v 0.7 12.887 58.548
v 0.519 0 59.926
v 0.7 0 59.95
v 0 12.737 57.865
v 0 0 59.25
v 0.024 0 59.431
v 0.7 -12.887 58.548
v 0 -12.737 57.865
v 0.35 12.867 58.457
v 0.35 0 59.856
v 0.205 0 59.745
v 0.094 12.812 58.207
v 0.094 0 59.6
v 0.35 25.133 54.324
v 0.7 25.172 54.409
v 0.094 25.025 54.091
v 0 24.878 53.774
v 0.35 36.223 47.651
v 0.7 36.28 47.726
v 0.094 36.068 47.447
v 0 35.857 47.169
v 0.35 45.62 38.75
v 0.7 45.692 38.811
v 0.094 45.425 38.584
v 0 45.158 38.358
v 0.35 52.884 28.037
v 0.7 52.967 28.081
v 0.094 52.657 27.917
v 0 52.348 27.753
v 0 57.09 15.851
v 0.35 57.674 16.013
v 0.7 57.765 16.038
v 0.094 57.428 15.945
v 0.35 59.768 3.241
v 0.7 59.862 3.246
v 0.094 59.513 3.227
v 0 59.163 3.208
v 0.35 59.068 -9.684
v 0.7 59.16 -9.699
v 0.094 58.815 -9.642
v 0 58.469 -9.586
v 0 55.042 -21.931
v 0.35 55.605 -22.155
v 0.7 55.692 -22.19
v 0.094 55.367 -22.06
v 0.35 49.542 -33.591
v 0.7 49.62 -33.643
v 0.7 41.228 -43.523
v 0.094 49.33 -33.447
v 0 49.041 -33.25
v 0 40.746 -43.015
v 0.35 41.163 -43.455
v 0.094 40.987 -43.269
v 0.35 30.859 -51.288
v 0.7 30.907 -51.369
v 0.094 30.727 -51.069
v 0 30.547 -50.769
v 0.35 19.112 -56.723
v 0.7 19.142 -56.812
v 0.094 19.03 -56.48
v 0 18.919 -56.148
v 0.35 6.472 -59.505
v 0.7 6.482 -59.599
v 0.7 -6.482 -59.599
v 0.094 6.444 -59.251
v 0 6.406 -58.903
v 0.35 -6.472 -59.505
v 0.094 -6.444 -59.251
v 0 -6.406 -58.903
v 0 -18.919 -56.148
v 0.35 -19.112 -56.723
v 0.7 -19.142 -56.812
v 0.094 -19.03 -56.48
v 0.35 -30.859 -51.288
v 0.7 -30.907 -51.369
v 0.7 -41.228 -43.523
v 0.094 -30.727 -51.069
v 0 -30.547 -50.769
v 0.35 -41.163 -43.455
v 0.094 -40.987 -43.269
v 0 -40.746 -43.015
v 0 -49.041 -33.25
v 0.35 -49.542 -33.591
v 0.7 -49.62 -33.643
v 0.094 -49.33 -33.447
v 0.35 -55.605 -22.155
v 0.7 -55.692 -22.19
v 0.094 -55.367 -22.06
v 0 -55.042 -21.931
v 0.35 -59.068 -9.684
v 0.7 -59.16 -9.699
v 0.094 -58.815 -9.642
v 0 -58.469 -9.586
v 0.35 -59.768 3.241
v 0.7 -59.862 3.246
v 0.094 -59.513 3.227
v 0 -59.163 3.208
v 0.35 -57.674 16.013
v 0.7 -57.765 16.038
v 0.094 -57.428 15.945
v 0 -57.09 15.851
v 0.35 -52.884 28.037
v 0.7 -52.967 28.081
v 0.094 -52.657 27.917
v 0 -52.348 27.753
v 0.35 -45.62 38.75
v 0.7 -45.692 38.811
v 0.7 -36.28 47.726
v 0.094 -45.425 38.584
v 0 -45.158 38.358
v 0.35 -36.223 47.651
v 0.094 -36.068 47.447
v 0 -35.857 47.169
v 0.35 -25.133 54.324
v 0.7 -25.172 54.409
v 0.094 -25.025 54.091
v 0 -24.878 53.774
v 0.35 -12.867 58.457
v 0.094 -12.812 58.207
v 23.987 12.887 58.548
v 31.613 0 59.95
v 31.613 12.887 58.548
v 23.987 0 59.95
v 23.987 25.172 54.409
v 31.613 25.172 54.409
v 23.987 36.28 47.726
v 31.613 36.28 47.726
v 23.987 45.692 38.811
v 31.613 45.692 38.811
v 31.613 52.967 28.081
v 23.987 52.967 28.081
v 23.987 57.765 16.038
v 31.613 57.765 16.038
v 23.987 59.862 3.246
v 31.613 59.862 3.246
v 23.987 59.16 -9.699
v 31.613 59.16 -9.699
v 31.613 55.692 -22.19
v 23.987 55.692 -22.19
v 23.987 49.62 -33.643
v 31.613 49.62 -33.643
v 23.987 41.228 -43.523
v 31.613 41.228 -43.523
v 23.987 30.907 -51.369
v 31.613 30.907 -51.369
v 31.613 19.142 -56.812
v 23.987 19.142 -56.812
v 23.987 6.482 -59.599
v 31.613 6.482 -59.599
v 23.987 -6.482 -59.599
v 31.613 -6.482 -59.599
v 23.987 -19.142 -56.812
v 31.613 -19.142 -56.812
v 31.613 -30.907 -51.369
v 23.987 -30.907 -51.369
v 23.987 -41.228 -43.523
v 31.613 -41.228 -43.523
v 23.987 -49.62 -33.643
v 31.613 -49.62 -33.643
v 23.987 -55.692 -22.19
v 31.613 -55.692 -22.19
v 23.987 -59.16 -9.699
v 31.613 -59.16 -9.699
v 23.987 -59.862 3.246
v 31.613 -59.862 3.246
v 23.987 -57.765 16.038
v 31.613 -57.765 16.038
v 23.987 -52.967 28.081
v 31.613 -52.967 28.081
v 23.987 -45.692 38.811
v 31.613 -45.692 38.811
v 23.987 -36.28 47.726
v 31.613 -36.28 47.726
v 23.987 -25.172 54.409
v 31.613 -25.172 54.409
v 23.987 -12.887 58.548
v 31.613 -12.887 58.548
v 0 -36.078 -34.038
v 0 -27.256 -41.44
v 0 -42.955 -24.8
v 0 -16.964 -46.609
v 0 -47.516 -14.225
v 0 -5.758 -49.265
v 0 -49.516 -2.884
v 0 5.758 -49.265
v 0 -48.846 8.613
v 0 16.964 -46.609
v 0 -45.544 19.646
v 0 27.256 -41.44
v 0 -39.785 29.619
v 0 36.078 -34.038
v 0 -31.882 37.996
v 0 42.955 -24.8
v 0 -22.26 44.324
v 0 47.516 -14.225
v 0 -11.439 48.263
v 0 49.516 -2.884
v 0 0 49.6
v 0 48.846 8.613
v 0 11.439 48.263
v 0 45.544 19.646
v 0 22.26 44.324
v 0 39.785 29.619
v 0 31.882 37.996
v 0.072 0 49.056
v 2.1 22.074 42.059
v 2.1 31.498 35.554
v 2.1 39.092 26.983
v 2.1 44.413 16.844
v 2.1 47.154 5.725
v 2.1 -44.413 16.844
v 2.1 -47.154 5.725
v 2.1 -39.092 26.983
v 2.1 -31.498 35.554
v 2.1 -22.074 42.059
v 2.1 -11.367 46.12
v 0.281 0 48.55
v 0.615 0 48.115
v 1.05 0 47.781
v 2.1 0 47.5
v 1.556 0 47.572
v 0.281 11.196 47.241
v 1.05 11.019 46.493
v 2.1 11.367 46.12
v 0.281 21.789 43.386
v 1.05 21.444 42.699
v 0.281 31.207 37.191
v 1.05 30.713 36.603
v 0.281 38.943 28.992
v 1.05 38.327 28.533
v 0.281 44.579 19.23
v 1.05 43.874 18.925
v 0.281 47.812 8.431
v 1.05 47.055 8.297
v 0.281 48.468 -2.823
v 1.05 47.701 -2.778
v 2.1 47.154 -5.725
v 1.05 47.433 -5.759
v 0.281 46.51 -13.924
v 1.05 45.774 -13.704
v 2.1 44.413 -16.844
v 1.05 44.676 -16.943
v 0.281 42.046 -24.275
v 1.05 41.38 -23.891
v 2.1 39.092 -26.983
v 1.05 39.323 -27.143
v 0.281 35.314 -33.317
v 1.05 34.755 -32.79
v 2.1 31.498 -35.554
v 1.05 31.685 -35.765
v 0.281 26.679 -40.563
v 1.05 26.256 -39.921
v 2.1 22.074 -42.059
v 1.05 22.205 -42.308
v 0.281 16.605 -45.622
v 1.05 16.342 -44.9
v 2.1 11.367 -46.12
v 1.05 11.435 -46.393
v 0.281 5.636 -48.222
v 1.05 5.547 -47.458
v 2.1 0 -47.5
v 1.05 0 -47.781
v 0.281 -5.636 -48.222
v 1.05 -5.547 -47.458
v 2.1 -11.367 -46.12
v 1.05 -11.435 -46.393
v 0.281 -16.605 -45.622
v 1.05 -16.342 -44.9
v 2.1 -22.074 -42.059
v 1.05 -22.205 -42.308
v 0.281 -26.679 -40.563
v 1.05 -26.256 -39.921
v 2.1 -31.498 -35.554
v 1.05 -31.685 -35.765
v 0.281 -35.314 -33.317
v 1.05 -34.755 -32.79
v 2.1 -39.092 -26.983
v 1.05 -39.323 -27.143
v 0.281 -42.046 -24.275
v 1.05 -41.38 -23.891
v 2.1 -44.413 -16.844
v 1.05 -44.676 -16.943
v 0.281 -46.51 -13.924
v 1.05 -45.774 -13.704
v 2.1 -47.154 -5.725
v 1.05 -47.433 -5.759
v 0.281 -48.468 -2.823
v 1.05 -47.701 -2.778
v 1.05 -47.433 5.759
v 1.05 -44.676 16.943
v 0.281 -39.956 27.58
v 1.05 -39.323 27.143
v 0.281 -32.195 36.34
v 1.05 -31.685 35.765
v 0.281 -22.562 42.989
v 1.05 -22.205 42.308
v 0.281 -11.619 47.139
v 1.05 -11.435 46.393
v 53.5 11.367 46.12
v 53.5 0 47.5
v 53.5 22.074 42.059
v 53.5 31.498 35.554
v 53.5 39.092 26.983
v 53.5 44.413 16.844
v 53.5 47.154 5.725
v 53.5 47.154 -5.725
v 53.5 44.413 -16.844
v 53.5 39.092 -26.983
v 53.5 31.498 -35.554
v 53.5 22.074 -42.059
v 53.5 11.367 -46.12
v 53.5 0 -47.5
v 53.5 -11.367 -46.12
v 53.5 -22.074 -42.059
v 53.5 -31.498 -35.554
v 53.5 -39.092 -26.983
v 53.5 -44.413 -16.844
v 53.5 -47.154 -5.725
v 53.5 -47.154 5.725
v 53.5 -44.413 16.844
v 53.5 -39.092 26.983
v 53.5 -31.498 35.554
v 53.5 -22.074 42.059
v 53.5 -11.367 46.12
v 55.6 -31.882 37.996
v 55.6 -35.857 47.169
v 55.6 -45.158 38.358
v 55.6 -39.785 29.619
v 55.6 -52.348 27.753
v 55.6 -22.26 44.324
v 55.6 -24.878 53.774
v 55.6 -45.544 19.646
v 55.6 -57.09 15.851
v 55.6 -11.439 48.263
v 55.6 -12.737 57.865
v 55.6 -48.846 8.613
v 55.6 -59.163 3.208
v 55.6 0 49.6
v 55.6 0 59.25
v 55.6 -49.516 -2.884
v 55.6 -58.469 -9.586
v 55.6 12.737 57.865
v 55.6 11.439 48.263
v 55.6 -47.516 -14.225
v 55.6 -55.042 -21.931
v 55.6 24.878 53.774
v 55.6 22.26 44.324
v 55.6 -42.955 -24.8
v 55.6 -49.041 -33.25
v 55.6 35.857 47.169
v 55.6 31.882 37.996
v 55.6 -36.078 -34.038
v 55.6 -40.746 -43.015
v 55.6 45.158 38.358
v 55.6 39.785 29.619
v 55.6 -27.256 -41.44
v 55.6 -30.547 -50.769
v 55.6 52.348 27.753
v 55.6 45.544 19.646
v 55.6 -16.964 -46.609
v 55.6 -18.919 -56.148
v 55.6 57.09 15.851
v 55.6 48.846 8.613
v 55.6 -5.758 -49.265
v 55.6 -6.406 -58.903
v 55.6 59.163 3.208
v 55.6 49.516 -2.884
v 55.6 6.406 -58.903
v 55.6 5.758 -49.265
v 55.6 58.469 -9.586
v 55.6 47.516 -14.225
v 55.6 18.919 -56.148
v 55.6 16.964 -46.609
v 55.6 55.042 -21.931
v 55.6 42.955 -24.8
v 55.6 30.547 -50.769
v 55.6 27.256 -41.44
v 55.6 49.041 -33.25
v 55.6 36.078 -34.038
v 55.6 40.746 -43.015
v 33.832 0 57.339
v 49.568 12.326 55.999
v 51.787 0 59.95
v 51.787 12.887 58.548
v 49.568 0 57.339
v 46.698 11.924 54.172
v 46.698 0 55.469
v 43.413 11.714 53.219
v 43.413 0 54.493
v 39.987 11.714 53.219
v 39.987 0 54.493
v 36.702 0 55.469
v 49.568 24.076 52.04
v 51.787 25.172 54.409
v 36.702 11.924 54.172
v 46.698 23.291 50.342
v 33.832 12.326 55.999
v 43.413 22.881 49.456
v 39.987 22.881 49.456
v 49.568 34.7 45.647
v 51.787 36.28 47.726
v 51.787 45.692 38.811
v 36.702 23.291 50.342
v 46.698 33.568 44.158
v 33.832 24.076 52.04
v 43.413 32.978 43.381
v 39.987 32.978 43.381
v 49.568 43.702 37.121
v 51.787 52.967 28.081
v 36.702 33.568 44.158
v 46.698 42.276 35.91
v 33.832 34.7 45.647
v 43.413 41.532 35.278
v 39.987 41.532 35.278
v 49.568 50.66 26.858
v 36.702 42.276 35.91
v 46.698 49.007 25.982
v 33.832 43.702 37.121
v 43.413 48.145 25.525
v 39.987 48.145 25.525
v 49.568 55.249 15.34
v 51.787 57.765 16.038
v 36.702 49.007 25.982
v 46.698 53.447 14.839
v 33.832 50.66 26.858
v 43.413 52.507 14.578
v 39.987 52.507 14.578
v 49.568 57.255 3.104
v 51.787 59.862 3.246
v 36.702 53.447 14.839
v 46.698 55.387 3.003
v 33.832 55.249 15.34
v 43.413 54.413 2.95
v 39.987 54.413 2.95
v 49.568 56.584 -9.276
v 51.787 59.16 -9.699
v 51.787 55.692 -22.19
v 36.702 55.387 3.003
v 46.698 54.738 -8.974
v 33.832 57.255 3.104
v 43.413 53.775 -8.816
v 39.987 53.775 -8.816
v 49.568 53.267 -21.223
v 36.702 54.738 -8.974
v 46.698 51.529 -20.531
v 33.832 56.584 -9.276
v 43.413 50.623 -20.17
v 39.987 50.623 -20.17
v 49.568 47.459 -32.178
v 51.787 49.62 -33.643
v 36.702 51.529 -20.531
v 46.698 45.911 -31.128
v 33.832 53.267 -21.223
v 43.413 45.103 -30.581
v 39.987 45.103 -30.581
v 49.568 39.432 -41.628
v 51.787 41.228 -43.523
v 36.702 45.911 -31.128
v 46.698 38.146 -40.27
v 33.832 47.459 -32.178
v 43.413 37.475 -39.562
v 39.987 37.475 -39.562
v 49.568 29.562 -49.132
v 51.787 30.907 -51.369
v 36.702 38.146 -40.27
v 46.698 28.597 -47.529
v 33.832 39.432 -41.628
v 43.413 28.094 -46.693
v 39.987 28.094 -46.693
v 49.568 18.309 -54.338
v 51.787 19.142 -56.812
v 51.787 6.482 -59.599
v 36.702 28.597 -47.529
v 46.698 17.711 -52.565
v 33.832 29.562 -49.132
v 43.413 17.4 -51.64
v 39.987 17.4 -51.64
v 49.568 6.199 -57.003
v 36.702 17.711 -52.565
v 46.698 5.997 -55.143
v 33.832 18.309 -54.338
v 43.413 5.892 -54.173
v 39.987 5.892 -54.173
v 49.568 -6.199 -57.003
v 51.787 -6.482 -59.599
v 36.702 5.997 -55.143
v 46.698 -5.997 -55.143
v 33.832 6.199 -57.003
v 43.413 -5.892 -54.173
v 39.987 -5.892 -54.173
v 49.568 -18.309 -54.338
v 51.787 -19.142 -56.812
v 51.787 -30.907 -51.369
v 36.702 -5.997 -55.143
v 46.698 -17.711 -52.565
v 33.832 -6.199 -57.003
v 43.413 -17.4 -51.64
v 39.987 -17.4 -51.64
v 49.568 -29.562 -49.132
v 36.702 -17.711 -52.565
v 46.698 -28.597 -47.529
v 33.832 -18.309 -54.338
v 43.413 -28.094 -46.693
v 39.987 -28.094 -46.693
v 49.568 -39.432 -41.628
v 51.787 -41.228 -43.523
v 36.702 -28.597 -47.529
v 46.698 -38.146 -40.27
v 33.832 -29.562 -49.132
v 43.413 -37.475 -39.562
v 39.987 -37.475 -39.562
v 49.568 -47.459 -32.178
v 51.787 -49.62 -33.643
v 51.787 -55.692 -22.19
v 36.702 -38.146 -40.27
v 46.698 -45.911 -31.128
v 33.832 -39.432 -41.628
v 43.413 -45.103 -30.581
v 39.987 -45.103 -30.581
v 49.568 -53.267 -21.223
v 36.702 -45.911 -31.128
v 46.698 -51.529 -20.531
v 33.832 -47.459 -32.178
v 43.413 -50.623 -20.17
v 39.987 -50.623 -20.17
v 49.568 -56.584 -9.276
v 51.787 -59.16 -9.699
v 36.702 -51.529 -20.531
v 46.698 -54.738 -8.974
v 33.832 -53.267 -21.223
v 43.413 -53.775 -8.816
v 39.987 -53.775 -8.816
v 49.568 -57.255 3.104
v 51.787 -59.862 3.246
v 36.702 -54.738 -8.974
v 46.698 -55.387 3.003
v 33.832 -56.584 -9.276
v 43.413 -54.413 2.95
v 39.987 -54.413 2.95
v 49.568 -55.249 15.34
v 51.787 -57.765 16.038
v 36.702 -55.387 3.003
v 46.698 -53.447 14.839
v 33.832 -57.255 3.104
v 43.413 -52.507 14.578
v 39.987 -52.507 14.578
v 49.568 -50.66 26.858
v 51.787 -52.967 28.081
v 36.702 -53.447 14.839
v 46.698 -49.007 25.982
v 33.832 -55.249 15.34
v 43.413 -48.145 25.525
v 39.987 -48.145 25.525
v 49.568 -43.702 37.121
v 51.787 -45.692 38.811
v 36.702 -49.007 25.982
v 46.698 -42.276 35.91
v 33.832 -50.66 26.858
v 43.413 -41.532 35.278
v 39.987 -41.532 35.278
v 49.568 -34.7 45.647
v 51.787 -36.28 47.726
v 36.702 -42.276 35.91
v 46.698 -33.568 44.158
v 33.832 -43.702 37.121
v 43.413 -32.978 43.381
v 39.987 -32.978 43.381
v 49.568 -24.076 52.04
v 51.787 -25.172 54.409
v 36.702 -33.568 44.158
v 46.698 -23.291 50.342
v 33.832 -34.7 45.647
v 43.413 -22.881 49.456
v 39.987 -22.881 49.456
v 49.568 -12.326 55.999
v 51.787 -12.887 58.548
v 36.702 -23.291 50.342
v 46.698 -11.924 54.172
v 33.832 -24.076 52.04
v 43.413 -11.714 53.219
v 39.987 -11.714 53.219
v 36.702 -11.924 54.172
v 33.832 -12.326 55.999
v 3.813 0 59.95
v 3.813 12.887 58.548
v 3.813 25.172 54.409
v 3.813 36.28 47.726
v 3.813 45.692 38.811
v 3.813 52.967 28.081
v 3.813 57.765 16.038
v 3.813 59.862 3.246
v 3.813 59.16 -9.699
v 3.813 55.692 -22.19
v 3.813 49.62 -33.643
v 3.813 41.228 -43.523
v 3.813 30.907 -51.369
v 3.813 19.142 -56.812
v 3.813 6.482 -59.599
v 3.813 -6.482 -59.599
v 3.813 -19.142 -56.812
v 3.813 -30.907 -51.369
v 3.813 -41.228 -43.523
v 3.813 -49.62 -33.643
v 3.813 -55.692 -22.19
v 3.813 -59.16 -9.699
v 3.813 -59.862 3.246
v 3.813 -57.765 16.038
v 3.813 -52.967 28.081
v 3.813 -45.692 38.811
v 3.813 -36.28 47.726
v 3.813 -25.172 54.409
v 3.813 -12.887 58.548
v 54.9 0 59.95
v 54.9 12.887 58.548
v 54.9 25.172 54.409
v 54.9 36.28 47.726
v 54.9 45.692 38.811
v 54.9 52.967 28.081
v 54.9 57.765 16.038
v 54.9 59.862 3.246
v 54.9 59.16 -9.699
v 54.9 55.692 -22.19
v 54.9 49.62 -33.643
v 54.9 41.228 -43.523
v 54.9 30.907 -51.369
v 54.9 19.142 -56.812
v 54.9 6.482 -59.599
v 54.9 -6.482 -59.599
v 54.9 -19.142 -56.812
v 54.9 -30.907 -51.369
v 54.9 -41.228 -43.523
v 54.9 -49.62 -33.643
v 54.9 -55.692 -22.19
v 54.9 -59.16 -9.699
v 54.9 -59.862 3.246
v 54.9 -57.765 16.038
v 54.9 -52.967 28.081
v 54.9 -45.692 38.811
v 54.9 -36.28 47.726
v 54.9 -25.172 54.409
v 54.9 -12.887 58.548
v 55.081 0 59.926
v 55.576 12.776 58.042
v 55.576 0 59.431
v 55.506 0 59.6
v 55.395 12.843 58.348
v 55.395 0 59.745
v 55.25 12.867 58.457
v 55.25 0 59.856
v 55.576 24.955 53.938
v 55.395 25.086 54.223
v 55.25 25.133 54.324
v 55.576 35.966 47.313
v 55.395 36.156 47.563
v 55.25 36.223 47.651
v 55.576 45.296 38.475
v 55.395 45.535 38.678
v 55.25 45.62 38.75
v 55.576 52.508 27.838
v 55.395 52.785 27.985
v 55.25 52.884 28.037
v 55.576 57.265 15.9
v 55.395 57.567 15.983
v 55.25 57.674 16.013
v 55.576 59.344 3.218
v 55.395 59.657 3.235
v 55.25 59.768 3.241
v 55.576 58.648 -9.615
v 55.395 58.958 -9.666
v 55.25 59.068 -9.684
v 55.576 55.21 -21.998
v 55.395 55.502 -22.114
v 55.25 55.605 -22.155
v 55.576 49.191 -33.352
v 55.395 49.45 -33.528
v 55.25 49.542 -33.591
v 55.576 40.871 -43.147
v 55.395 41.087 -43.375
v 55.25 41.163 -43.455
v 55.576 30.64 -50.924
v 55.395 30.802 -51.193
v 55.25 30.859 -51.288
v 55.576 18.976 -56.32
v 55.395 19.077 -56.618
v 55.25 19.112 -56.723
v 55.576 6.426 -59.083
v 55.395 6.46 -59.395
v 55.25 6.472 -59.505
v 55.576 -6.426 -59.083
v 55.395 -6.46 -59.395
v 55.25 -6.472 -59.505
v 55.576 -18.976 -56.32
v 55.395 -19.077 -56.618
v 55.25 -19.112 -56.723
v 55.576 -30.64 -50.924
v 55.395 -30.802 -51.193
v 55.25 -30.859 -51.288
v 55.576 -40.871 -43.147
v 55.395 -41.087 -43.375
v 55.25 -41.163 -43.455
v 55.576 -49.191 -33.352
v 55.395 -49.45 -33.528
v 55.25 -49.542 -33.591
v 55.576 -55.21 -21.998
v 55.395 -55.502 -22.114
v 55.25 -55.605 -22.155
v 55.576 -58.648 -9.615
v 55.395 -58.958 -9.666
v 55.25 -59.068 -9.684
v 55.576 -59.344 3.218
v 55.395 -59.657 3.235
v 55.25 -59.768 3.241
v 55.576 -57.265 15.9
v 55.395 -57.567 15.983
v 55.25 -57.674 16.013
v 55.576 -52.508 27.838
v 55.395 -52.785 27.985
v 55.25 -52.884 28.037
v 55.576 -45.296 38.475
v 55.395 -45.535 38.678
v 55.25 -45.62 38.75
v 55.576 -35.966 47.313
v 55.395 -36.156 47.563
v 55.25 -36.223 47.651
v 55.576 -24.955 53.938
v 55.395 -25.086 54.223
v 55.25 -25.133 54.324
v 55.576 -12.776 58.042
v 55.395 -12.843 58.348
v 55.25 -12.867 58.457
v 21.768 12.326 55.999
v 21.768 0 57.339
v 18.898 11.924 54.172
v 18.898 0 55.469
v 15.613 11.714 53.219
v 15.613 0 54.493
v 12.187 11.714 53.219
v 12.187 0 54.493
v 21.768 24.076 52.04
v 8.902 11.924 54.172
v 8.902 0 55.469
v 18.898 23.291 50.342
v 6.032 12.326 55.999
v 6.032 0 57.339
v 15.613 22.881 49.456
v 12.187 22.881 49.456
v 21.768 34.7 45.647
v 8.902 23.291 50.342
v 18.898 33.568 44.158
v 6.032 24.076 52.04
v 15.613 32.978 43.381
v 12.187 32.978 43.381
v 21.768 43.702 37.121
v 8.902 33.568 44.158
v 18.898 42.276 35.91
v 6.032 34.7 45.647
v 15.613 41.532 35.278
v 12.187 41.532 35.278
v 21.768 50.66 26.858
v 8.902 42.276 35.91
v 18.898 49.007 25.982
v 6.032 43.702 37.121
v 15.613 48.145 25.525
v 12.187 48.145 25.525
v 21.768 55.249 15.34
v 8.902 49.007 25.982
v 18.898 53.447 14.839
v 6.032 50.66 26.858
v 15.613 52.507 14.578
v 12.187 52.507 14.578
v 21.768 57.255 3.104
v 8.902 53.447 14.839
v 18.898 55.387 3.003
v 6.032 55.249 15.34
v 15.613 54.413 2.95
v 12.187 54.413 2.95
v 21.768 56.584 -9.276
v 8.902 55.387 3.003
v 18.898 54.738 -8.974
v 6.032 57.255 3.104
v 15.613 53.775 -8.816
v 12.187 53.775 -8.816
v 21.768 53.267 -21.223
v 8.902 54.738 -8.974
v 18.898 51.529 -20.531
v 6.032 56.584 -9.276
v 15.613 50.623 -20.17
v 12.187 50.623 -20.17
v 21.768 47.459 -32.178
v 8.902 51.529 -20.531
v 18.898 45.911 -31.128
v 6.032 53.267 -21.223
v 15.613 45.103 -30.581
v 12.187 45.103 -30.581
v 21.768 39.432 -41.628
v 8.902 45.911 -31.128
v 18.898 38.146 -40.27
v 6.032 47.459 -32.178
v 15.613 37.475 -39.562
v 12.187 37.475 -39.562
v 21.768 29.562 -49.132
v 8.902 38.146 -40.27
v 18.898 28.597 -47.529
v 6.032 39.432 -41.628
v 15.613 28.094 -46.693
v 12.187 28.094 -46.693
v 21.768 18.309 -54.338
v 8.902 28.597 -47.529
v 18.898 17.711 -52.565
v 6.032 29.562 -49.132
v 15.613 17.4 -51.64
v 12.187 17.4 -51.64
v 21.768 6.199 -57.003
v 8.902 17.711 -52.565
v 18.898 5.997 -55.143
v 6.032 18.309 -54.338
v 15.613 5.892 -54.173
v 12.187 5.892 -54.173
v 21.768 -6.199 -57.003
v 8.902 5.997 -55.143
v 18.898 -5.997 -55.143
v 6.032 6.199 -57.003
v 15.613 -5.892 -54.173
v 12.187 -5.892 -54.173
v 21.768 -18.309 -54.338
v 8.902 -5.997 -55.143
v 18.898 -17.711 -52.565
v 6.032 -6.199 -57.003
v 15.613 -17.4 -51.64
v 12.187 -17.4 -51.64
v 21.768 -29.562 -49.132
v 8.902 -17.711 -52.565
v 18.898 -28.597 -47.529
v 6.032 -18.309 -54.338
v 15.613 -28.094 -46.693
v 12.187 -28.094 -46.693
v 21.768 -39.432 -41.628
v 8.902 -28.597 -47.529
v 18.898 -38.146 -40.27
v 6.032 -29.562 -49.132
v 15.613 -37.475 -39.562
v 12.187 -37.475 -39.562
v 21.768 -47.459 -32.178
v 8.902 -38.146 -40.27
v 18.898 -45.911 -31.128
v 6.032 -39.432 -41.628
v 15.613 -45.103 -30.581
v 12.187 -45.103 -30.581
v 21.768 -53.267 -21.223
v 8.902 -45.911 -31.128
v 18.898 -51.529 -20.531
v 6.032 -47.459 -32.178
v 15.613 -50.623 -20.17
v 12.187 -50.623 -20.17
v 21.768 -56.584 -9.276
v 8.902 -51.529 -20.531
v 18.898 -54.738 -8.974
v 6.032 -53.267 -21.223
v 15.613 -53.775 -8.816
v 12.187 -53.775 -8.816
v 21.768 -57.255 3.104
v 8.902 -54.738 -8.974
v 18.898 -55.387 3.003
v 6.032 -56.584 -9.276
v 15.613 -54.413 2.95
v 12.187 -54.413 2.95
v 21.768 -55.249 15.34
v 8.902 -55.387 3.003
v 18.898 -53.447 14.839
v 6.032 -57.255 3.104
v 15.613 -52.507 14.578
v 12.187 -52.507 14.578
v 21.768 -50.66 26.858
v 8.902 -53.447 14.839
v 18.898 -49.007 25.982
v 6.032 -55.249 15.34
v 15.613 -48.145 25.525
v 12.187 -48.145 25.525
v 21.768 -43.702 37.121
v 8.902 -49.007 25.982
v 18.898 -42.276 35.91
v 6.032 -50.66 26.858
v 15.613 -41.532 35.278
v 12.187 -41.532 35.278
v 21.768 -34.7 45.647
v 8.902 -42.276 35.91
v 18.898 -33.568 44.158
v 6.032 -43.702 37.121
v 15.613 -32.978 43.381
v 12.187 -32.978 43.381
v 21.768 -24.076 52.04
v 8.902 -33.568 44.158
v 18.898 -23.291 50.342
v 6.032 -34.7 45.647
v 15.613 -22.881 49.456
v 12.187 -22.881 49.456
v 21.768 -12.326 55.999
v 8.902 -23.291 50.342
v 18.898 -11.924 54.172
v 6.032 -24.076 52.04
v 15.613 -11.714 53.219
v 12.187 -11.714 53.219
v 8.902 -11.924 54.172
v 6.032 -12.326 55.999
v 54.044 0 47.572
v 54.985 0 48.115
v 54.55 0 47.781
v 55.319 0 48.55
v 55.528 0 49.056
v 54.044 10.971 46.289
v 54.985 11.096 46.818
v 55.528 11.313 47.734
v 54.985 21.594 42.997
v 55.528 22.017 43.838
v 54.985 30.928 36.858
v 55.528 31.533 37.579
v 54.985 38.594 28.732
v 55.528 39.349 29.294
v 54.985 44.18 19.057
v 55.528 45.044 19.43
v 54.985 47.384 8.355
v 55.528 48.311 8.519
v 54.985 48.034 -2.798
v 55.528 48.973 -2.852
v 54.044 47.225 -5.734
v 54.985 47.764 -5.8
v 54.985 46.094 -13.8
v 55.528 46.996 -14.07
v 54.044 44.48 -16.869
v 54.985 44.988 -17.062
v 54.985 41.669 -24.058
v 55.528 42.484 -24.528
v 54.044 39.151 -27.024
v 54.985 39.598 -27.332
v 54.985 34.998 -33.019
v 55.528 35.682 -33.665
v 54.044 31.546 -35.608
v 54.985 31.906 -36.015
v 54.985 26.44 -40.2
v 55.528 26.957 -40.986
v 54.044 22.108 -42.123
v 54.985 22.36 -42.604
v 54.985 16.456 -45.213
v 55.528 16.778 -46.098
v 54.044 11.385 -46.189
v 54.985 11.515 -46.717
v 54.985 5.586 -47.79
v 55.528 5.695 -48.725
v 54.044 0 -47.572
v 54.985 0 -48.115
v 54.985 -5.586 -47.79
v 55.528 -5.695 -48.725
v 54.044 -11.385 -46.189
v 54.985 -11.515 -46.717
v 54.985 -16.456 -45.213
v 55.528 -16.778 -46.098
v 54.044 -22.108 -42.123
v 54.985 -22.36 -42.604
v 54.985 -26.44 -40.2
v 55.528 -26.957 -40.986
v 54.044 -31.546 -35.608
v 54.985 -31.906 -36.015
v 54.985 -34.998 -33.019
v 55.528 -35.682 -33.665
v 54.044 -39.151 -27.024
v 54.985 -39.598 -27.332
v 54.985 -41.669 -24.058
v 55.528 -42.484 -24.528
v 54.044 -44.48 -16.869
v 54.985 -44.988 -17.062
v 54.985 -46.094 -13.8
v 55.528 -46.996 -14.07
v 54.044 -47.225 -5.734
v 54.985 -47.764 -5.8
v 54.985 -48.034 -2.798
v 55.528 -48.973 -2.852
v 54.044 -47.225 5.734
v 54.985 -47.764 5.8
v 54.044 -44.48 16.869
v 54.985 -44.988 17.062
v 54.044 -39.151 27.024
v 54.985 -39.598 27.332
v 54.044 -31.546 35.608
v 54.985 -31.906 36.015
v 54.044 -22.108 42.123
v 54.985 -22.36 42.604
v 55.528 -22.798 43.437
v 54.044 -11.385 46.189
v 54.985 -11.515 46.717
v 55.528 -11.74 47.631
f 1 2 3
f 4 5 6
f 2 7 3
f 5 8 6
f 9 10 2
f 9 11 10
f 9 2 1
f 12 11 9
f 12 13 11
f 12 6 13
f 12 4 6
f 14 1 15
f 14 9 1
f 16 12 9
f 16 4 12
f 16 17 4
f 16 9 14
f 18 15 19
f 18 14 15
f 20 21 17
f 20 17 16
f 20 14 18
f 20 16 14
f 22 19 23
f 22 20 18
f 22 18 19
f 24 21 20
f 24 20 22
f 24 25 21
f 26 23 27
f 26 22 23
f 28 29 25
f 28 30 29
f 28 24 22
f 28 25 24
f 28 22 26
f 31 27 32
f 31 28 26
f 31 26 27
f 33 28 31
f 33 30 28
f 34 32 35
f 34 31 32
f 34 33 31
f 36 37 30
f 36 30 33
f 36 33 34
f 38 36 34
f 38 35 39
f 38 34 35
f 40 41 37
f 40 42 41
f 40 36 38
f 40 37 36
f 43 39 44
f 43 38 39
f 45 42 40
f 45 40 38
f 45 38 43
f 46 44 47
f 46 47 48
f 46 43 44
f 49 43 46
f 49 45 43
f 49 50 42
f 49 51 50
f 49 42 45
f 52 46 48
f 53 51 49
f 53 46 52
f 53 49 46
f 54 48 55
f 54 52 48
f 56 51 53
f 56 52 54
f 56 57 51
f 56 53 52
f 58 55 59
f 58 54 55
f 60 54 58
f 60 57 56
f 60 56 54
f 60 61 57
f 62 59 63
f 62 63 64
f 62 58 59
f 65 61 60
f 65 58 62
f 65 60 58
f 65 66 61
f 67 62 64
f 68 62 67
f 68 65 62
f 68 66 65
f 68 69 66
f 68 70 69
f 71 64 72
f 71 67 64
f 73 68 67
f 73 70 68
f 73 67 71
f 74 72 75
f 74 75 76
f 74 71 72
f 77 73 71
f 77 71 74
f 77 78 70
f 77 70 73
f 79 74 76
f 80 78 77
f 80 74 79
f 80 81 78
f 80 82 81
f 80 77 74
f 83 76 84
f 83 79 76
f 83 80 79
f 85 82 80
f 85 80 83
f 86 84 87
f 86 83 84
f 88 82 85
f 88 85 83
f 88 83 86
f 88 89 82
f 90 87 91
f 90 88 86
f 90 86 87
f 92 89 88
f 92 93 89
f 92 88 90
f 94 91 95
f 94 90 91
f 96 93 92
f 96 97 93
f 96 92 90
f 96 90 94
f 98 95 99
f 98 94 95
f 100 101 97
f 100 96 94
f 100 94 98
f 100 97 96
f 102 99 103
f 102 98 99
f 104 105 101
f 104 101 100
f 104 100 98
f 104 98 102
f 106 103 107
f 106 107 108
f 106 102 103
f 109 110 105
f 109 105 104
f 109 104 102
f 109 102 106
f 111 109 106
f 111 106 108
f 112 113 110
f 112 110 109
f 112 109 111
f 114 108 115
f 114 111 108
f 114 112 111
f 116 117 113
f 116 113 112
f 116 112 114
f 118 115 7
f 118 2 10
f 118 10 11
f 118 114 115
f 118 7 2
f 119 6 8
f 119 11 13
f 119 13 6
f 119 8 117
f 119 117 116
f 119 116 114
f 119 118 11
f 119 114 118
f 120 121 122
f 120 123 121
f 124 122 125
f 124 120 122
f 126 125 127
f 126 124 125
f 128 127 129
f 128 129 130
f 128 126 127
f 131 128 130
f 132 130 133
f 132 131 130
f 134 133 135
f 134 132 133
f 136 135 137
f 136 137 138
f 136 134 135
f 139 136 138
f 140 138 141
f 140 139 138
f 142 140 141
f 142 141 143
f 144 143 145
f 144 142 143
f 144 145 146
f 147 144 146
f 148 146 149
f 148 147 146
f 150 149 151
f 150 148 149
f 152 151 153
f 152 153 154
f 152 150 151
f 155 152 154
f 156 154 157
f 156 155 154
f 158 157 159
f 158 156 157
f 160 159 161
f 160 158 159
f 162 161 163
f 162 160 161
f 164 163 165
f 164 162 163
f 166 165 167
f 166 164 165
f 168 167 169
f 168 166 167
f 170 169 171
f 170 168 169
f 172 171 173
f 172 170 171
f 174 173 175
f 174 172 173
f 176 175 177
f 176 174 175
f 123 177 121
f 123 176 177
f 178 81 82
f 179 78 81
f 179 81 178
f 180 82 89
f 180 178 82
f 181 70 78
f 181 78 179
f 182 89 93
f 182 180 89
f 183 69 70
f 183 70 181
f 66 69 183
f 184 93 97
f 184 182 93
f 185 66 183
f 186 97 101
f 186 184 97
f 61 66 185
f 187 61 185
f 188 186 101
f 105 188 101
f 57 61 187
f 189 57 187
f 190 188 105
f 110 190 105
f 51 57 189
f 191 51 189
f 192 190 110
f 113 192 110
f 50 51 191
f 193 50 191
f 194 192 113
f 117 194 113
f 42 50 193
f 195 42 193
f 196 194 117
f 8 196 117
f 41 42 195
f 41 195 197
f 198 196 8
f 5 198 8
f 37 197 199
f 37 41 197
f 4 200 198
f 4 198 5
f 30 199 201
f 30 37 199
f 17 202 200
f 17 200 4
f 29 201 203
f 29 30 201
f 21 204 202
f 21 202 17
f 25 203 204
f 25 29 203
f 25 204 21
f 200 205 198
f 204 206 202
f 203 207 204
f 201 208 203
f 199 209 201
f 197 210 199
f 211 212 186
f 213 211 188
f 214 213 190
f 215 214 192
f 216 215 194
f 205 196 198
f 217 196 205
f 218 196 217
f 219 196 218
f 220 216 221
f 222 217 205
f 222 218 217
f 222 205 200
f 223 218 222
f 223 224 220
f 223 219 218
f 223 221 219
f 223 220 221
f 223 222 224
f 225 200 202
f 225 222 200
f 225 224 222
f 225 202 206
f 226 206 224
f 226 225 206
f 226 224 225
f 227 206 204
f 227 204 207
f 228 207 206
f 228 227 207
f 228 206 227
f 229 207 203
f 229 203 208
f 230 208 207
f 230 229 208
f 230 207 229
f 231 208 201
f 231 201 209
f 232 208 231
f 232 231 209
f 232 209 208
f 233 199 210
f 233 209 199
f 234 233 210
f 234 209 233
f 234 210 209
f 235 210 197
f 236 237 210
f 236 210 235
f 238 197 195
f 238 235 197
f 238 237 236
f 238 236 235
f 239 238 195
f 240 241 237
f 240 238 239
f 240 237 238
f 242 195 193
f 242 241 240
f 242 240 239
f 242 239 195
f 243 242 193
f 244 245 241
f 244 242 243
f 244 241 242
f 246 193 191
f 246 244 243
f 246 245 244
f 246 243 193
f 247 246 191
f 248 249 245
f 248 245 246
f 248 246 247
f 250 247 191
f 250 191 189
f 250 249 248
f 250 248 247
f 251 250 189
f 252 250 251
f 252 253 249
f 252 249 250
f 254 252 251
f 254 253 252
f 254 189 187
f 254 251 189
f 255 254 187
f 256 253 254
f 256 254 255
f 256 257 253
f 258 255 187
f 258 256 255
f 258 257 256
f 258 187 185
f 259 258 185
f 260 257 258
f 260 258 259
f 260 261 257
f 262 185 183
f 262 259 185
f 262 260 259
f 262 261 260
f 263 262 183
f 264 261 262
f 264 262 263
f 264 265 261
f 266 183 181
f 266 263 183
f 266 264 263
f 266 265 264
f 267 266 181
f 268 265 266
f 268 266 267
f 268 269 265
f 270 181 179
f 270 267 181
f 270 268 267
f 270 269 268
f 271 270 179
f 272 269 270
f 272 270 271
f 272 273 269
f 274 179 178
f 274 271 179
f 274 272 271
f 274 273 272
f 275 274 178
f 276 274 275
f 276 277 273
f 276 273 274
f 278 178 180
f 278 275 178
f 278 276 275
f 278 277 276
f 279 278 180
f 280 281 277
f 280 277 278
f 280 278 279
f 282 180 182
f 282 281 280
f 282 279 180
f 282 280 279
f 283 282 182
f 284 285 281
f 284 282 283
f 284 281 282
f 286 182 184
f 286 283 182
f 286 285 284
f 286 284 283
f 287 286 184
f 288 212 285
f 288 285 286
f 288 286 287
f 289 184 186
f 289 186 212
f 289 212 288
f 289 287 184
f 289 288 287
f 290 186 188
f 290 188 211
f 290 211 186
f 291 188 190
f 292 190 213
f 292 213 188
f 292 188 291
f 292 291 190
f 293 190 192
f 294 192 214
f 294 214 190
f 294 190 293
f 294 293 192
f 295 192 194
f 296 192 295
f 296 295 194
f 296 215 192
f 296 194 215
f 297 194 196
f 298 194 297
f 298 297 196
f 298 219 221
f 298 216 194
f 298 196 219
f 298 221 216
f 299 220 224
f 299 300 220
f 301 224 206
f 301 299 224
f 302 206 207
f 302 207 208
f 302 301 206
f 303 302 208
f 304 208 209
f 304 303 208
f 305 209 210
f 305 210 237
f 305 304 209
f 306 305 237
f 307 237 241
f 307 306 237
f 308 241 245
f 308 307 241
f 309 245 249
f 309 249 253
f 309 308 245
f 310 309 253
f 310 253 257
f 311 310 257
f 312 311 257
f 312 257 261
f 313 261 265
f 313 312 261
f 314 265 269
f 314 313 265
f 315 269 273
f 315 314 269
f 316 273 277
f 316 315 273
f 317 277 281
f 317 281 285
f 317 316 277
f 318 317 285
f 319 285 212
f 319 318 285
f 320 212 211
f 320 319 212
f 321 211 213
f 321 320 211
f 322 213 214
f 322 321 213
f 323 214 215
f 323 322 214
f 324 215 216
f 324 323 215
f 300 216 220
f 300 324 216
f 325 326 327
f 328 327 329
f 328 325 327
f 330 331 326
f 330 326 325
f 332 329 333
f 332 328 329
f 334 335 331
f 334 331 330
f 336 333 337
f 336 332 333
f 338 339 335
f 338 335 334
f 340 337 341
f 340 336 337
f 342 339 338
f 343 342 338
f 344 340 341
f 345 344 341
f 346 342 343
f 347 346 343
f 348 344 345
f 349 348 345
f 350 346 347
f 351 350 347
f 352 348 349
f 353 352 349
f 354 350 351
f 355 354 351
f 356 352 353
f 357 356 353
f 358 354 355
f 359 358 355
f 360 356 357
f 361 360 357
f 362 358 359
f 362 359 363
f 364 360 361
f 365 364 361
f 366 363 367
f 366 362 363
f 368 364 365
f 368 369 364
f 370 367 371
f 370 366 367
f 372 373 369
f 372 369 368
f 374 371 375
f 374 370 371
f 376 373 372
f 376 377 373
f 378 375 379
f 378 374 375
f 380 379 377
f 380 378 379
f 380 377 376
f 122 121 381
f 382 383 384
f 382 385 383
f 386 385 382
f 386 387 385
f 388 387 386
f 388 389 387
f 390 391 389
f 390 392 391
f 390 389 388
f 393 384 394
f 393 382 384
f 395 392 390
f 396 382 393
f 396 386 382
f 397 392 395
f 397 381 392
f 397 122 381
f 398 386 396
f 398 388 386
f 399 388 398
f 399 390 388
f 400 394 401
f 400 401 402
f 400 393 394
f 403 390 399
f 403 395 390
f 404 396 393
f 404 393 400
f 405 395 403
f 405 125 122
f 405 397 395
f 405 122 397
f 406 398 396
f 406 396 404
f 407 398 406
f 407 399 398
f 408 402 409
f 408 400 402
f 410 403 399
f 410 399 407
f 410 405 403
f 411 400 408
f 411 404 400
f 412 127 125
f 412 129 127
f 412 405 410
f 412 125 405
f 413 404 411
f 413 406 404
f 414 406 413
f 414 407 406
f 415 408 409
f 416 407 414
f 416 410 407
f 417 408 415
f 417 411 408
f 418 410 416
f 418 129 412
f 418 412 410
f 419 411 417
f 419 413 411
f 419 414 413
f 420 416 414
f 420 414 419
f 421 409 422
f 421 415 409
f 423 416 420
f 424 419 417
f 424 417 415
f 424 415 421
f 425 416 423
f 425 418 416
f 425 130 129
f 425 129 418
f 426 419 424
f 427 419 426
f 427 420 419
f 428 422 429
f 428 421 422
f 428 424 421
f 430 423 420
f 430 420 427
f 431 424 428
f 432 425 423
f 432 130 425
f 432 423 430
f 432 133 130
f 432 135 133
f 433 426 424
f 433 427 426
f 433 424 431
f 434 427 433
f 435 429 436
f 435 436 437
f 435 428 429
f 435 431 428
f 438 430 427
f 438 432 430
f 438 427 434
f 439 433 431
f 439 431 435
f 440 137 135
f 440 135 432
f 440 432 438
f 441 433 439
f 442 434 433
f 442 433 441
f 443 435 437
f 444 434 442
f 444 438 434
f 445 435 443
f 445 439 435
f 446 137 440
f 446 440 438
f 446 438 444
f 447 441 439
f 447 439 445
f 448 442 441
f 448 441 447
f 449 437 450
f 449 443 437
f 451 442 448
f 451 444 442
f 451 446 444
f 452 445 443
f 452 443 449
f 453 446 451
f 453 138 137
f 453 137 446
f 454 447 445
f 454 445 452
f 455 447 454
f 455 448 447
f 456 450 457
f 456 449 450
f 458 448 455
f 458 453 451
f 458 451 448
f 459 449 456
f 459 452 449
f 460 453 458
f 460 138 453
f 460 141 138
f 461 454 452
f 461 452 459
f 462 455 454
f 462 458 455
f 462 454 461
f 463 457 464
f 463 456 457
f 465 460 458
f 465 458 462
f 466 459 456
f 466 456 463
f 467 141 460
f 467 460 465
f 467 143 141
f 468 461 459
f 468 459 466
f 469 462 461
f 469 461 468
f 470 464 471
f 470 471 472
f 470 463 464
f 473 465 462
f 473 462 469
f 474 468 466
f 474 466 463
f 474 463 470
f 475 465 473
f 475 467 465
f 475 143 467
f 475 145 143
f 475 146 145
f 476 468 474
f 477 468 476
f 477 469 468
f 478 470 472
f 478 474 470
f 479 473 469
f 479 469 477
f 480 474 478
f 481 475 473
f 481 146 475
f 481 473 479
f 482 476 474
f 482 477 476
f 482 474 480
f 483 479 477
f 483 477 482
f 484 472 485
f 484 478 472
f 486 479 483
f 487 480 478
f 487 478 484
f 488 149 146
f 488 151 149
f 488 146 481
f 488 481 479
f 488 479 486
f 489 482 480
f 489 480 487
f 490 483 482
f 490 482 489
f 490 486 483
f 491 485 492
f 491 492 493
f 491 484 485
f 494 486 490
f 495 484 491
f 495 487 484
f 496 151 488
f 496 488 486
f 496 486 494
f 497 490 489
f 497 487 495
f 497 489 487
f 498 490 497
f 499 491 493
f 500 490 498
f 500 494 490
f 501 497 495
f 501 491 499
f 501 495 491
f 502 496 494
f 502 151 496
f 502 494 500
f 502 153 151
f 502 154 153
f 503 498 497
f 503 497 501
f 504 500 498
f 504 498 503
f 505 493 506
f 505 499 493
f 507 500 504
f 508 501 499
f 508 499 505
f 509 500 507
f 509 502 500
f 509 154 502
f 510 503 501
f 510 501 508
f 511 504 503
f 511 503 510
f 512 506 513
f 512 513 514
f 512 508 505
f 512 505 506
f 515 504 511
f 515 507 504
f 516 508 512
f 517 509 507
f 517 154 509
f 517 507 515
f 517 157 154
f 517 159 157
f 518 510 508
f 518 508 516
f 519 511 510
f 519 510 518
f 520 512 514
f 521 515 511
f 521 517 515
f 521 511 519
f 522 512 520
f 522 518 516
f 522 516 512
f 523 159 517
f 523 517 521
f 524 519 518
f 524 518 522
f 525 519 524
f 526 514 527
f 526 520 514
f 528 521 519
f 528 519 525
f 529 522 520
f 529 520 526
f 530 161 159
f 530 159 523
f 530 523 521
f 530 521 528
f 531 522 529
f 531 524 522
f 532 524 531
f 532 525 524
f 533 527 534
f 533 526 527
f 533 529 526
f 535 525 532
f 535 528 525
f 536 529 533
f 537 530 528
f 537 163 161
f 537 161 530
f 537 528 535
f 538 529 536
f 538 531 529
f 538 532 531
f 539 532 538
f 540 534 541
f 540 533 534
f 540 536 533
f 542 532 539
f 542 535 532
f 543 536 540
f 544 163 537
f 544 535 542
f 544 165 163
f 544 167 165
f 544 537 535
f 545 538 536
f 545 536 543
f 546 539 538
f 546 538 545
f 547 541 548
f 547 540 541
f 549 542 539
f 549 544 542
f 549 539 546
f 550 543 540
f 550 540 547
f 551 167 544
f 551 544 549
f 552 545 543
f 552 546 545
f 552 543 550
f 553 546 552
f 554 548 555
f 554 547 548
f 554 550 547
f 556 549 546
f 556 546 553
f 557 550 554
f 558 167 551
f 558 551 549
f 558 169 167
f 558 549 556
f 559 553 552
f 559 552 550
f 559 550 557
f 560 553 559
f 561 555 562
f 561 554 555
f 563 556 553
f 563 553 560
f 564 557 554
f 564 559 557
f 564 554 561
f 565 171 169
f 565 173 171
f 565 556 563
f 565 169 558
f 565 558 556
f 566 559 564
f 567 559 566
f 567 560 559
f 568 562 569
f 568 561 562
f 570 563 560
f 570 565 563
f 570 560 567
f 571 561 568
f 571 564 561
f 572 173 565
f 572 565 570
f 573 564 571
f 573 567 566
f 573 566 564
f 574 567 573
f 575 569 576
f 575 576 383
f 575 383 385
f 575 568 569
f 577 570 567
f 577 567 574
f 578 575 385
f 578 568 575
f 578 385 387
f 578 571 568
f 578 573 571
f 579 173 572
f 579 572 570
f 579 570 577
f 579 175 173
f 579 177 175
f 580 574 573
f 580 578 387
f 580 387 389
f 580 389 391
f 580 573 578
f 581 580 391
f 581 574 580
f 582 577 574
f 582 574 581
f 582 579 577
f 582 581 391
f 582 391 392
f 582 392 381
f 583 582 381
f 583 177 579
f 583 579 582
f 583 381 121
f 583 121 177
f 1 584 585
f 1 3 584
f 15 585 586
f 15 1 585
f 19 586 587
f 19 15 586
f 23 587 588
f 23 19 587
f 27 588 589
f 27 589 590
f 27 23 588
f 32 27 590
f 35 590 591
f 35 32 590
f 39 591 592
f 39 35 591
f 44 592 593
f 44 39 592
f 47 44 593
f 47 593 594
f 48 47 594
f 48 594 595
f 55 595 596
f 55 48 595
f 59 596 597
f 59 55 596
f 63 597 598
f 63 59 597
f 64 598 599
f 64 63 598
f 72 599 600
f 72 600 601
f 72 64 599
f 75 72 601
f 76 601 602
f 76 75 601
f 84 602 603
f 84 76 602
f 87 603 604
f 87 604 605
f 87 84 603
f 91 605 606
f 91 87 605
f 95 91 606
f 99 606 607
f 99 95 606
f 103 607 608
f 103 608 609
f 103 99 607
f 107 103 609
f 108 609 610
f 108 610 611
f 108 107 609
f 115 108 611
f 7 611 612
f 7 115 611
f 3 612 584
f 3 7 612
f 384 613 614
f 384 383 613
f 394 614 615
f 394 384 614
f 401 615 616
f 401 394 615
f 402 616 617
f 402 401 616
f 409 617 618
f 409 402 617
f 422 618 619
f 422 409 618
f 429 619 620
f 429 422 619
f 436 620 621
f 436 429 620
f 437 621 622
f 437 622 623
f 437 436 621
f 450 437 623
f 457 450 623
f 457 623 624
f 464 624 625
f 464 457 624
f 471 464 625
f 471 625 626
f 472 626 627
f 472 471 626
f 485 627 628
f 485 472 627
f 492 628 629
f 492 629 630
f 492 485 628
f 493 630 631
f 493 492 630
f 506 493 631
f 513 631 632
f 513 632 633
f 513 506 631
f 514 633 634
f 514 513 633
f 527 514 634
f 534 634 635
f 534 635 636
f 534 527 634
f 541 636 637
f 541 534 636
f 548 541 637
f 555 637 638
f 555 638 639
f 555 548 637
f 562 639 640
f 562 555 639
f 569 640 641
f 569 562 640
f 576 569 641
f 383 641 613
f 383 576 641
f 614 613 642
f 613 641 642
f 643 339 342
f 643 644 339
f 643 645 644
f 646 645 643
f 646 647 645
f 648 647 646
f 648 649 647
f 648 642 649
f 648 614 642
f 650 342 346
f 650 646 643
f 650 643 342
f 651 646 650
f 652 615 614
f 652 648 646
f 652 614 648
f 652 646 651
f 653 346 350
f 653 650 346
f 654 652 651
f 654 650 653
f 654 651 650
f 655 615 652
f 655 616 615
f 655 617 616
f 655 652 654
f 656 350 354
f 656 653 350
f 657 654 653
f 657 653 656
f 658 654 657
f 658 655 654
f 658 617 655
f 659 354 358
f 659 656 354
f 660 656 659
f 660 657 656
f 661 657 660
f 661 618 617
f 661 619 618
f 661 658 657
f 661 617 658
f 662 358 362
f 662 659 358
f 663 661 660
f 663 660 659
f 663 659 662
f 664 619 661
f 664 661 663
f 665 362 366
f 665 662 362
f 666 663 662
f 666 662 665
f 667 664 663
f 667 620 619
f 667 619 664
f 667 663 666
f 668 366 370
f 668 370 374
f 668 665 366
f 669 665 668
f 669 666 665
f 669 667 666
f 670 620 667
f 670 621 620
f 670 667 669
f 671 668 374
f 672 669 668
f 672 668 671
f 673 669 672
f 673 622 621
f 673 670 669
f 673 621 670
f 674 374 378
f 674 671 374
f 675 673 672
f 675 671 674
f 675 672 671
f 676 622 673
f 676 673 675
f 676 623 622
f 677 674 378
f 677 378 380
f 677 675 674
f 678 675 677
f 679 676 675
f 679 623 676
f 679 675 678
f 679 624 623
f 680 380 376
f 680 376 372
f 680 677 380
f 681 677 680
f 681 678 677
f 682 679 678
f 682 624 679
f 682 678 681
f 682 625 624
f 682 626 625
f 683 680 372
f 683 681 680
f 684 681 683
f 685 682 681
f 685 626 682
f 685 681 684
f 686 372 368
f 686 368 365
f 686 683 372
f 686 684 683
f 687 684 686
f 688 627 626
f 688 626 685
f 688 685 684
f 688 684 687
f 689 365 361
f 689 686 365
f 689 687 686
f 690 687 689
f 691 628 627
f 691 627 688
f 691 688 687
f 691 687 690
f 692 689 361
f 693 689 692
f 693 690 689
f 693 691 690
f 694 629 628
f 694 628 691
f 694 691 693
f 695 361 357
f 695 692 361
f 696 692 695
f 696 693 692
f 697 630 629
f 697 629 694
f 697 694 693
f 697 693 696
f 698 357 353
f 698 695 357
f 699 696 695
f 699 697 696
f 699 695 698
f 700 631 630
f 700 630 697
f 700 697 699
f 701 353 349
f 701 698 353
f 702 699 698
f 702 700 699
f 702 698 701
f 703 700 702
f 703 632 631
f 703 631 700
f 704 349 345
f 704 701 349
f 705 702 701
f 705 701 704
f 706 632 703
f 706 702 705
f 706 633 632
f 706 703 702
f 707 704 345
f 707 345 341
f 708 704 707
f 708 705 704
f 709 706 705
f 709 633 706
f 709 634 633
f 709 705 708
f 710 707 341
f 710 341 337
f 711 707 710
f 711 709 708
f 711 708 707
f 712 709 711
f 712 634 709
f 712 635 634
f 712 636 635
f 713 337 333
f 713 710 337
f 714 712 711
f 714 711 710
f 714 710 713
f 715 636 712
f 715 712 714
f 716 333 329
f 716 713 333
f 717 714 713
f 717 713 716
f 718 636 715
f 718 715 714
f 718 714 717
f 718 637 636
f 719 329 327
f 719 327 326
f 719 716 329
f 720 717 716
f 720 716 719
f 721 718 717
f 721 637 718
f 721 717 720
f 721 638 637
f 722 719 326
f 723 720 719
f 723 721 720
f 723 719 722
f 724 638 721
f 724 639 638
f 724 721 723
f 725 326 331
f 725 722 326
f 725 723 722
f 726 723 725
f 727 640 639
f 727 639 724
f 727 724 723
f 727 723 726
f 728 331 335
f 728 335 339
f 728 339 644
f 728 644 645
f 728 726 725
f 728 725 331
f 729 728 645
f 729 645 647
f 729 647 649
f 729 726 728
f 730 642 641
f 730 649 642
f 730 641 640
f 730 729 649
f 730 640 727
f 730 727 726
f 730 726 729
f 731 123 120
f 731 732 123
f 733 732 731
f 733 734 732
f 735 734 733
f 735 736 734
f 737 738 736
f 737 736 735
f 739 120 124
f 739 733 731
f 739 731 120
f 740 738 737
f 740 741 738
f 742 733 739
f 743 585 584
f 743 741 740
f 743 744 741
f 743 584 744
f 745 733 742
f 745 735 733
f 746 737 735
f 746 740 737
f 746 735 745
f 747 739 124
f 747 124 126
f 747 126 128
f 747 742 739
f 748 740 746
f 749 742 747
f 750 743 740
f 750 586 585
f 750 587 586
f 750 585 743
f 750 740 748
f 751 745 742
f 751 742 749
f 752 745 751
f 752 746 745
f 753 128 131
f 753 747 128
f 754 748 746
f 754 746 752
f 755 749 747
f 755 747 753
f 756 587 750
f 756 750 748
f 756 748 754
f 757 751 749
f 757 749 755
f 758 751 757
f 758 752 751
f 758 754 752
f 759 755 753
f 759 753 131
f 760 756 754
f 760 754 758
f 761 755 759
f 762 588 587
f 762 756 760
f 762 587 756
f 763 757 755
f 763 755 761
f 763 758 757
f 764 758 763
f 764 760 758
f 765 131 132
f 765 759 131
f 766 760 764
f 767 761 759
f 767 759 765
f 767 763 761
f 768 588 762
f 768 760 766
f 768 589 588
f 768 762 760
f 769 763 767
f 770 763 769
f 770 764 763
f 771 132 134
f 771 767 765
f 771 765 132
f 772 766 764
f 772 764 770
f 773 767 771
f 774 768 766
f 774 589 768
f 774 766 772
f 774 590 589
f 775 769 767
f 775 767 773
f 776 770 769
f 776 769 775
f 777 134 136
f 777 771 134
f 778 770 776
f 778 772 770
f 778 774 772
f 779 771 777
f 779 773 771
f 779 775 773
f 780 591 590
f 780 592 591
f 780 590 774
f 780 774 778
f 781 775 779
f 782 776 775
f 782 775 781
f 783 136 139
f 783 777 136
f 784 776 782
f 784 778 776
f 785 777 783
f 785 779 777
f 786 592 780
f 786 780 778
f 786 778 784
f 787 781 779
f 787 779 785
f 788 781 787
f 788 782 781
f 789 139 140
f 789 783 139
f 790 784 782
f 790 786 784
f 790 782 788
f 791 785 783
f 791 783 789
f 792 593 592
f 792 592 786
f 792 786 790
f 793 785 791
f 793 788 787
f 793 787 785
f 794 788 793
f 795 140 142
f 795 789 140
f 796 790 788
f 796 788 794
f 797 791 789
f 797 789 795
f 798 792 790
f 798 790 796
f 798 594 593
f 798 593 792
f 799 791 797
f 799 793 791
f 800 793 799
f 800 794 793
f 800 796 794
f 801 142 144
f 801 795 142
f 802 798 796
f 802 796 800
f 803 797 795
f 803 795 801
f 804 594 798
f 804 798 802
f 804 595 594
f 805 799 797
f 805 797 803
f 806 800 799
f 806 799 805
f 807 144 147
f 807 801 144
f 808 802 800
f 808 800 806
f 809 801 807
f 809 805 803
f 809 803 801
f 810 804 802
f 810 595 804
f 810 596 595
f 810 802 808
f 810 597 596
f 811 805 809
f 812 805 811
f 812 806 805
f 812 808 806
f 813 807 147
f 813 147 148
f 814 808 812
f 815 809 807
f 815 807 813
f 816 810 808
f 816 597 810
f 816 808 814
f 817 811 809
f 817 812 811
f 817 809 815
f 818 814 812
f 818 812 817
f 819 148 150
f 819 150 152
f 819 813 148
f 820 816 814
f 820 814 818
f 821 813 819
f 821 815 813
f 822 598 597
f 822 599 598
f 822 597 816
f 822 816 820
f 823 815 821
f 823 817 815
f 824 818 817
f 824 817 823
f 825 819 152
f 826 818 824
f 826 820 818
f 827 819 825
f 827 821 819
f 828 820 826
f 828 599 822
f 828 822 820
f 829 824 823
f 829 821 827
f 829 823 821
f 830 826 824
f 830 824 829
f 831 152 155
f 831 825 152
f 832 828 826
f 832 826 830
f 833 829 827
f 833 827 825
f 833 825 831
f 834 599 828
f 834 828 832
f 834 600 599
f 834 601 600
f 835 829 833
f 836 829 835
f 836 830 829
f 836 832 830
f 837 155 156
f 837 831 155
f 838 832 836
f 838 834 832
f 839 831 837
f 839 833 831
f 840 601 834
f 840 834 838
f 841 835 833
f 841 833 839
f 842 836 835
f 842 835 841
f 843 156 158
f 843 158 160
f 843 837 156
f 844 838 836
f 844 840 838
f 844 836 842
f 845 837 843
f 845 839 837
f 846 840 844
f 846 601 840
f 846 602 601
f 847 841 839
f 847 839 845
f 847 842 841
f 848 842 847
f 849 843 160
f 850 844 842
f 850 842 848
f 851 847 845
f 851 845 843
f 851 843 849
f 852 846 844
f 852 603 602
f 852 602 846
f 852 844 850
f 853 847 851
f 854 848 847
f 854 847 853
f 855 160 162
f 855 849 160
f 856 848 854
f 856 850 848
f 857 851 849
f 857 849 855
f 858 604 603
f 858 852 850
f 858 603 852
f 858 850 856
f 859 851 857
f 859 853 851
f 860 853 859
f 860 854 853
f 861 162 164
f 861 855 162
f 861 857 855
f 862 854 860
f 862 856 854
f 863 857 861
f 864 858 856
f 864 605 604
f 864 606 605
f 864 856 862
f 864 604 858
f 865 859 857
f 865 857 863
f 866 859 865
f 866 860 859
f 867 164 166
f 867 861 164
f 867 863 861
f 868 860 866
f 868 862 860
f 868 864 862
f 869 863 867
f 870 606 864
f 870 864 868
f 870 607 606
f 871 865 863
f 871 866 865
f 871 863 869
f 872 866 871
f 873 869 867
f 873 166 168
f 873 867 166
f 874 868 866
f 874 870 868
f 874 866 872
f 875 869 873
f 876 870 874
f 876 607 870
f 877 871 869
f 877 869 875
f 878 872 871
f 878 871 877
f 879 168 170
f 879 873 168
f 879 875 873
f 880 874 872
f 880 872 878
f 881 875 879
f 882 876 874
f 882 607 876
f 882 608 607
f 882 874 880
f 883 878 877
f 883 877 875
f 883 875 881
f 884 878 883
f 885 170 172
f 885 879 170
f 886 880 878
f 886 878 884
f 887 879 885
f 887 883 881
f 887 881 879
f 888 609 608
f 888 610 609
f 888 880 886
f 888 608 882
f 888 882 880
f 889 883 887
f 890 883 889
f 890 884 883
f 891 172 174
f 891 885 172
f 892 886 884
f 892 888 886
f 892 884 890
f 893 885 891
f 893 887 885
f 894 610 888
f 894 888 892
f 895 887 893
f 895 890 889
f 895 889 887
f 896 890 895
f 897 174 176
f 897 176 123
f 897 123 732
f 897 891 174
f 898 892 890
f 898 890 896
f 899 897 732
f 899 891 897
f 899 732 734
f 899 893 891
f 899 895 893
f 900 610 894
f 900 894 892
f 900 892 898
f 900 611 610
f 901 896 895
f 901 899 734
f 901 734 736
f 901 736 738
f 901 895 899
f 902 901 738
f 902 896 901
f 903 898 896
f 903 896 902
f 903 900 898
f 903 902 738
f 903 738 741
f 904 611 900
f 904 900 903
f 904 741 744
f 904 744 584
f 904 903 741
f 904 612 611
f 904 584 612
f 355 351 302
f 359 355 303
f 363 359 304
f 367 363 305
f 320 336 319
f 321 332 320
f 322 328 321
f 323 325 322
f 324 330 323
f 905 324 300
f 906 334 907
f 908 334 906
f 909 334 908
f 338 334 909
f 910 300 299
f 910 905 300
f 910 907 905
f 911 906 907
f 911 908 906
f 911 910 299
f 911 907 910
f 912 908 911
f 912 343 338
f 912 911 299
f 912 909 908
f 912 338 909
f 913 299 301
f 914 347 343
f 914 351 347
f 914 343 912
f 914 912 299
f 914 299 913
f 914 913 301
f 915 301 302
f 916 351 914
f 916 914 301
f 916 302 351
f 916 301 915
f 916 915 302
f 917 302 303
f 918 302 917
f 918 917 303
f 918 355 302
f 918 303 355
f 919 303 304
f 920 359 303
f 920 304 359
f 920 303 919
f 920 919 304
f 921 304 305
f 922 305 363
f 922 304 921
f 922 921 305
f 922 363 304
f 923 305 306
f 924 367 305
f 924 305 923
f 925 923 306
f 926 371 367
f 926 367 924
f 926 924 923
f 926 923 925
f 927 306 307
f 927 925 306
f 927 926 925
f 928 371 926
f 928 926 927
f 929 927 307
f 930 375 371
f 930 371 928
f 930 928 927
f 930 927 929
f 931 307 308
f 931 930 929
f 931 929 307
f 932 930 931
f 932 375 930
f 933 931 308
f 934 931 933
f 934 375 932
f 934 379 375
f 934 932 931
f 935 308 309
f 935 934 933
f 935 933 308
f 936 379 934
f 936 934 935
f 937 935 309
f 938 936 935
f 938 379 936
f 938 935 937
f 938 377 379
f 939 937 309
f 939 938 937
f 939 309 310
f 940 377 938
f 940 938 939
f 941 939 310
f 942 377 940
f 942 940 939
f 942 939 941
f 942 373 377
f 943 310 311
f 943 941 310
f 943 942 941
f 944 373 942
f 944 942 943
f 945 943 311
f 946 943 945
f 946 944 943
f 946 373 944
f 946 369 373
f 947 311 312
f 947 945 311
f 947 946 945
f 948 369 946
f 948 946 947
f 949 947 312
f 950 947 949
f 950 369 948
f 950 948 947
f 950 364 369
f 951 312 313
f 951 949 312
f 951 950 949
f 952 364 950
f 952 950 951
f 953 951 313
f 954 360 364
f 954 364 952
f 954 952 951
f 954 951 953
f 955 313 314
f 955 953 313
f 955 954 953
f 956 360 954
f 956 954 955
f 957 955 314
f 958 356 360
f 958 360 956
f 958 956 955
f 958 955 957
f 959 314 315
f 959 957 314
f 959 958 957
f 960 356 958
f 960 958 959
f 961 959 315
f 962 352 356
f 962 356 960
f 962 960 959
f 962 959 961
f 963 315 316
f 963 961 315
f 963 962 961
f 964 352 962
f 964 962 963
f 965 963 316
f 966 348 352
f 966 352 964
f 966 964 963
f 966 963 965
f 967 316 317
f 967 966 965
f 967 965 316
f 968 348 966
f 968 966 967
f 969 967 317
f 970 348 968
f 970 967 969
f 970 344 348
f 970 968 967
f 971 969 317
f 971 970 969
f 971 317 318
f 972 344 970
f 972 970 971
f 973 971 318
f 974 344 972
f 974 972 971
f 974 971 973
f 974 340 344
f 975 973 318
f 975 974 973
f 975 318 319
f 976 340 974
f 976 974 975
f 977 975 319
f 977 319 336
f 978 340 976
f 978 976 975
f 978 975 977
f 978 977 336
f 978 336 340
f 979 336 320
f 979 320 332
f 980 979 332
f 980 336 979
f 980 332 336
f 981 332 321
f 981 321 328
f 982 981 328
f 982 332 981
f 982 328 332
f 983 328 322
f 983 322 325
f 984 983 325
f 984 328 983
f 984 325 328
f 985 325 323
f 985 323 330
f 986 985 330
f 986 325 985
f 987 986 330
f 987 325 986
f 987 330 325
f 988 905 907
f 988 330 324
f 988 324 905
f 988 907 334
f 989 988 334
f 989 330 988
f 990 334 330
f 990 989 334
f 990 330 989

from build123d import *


with BuildPart() as part:
    # Schizzo1 → Rivoluzione1 (revolve)
    with BuildSketch(Plane.XY, mode=Mode.PRIVATE) as rivoluzione1_sk:
        with BuildLine():
            Line((2.1, 47.5), (53.5, 47.5))
            ThreePointArc((53.5, 47.5), (54.98492424, 48.11507576), (55.6, 49.6))
            Line((55.6, 49.6), (55.6, 59.25))
            ThreePointArc((55.6, 59.25), (55.394974747, 59.744974747), (54.9, 59.95))
            Line((54.9, 59.95), (51.786982254, 59.95))
            ThreePointArc((51.786982254, 59.95), (41.7, 54.369), (31.613017746, 59.95))
            Line((31.613017746, 59.95), (23.986982254, 59.95))
            ThreePointArc((23.986982254, 59.95), (13.9, 54.369), (3.813017746, 59.95))
            Line((3.813017746, 59.95), (0.7, 59.95))
            ThreePointArc((0.7, 59.95), (0.205025253, 59.744974747), (0, 59.25))
            Line((0, 59.25), (0, 49.6))
            ThreePointArc((0, 49.6), (0.61507576, 48.11507576), (2.1, 47.5))
        make_face()
    revolve(rivoluzione1_sk.sketch.rotate(Axis((55.6, 0, 0), (-1, 0, 0)), 270), axis=Axis((55.6, 0, 0), (-1, 0, 0)))


solid = part.part
